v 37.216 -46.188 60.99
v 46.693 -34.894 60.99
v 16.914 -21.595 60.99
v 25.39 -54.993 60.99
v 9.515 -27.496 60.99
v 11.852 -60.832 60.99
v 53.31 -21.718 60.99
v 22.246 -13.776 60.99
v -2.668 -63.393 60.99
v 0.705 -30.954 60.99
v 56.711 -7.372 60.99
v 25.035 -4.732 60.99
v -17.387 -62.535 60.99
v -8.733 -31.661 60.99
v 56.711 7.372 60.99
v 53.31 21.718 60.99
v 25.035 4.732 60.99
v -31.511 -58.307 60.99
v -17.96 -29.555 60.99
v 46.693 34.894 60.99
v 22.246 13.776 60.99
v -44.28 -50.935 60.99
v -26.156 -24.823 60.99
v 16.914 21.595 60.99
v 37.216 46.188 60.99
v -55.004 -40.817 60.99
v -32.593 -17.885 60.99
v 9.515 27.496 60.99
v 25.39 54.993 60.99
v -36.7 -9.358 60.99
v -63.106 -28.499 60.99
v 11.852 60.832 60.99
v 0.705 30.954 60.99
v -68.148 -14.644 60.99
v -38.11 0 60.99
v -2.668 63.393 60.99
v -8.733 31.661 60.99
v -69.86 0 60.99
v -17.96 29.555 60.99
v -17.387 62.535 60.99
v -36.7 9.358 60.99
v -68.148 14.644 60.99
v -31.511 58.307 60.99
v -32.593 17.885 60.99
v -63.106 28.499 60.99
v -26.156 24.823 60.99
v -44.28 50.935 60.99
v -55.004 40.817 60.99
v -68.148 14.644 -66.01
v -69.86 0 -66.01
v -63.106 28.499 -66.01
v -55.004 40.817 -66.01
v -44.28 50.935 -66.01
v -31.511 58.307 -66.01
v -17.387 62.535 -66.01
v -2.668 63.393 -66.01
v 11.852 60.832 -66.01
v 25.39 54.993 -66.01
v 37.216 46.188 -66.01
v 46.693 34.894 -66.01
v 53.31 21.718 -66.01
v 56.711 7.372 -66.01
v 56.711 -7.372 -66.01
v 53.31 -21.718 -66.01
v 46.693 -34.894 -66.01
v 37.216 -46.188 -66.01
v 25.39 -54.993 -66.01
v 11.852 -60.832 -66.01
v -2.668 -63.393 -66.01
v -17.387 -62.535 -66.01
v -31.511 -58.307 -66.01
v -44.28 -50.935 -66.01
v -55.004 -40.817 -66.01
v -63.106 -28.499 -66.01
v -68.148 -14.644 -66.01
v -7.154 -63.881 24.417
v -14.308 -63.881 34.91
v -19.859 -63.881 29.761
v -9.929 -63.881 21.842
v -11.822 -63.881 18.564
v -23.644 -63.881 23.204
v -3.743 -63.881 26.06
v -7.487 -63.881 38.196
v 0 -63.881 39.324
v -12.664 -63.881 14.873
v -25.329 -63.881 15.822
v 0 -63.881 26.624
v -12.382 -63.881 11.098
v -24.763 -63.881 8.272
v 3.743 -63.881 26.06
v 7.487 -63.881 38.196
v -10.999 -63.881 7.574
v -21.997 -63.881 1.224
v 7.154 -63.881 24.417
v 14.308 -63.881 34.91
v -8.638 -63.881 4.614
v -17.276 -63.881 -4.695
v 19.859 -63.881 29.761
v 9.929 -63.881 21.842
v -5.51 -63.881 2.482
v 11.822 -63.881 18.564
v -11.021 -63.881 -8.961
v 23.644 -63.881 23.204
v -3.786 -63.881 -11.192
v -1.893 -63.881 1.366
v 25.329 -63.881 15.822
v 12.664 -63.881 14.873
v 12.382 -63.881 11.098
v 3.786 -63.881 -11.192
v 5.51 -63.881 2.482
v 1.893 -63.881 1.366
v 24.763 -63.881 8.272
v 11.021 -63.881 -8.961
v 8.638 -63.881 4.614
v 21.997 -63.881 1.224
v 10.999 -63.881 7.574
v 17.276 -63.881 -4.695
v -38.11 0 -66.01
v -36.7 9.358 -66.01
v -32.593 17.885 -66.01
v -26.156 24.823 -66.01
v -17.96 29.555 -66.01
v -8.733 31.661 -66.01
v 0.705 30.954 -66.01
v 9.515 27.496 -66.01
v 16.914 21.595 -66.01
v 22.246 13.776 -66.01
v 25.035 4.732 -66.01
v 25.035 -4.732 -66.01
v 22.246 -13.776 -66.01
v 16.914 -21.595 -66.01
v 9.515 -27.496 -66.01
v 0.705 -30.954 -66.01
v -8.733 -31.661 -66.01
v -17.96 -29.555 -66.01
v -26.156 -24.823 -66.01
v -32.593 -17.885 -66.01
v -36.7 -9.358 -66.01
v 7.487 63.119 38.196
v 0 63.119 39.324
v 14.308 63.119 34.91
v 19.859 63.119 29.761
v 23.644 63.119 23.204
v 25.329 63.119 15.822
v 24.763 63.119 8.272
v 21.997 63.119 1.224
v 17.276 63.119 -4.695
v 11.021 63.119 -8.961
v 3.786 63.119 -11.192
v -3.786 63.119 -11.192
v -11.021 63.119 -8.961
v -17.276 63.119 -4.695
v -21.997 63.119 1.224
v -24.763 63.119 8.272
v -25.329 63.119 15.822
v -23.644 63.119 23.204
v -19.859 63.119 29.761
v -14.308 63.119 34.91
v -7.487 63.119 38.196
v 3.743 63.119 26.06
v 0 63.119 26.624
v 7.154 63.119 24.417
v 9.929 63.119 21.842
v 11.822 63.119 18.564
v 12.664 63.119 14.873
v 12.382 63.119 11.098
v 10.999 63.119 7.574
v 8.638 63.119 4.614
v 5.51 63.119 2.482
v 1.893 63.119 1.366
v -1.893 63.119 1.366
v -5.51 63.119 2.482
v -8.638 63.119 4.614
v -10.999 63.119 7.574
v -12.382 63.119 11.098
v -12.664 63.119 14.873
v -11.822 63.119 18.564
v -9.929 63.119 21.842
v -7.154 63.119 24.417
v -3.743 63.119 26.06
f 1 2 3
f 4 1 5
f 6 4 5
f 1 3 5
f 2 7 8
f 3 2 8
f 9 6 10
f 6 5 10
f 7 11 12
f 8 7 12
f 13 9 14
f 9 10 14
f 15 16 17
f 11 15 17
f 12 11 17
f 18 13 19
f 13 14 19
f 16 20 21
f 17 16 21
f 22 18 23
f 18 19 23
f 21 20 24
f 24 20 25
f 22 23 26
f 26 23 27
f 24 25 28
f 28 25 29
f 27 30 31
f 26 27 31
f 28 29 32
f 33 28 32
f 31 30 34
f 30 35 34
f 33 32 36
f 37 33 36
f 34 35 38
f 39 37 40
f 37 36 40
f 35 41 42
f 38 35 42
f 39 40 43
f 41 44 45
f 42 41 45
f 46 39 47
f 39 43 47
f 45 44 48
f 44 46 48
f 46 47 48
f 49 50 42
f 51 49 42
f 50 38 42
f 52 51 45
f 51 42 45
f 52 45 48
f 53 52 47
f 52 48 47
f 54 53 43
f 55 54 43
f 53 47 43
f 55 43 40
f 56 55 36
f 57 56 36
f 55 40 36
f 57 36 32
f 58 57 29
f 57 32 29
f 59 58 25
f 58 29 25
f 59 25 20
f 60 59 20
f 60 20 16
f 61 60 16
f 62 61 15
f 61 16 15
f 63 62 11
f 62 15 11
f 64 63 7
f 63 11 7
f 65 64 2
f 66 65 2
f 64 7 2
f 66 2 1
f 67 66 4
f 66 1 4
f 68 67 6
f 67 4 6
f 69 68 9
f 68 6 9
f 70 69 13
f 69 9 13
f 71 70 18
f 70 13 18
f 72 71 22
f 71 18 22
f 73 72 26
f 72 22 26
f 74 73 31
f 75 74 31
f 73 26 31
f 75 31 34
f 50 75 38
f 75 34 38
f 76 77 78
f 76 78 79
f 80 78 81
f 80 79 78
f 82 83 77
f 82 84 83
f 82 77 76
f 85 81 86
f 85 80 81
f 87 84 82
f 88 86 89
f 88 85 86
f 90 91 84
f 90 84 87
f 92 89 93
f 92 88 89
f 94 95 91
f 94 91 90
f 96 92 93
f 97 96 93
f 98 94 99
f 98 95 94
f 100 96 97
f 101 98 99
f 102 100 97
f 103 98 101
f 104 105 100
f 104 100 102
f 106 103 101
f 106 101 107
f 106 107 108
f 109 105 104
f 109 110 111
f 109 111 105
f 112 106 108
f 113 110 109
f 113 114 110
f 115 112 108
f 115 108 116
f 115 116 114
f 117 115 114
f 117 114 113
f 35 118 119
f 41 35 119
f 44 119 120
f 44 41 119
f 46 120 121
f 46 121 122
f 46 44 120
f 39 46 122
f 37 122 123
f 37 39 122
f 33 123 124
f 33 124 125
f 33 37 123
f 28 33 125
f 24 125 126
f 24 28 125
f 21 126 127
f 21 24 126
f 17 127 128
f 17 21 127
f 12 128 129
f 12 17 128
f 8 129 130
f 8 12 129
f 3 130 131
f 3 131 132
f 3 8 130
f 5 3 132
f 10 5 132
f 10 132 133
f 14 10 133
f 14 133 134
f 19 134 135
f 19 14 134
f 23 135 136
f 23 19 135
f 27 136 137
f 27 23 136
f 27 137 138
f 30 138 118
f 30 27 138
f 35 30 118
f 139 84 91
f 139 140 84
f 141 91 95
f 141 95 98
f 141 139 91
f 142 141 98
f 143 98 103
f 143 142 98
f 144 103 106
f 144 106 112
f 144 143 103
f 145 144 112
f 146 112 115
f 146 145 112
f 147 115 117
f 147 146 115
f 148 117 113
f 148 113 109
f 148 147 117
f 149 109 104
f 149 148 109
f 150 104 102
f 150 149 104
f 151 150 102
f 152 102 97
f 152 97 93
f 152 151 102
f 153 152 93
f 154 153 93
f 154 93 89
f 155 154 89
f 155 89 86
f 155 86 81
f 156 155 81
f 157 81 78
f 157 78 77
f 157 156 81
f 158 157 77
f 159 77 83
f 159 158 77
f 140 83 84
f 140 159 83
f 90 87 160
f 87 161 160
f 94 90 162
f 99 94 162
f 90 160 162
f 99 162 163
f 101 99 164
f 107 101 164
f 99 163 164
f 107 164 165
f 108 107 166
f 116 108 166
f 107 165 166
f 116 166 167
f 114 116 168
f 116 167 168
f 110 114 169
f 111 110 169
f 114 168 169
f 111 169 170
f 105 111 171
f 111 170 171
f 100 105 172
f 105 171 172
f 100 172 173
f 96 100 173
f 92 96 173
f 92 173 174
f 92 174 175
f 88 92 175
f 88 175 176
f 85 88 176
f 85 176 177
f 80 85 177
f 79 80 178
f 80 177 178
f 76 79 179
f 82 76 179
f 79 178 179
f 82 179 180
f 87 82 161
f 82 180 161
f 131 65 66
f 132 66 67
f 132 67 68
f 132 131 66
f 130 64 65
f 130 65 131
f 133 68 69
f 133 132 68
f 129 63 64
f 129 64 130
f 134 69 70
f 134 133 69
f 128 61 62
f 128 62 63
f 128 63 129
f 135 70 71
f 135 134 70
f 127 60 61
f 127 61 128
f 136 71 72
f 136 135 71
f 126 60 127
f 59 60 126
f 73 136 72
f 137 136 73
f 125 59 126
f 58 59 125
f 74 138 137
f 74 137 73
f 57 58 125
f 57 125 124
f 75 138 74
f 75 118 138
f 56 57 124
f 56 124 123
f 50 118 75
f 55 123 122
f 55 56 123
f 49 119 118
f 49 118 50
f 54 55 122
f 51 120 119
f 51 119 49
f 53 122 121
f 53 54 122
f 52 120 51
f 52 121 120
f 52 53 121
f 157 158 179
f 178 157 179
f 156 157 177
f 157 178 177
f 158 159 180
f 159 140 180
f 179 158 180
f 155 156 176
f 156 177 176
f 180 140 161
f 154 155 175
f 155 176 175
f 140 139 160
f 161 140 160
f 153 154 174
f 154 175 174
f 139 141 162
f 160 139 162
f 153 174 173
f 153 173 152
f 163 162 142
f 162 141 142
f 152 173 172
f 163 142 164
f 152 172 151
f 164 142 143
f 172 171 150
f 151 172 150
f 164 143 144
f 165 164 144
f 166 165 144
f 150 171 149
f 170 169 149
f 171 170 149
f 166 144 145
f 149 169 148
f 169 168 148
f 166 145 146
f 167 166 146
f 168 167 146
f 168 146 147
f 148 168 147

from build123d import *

# Parameters (mm, degrees)
F0_W = 31.75
F0_H = 127
F2_W = 127
F2_H = 12.7


with BuildPart() as f1:
    # F0 (on Front) → F1 (revolve)
    with BuildSketch(Plane.XZ):
        with Locations((-53.985089, -2.509642)):
            Rectangle(F0_W, F0_H)
    revolve(axis=Axis((-6.360089, 0, -2.509642), (0, 0, -1)))


with BuildPart() as f3:
    # F2 (on Right) → F3 (revolve)
    with BuildSketch(Plane.YZ):
        with Locations((-0.381, 32.974018)):
            Rectangle(F2_W, F2_H)
    revolve(axis=Axis((0, -0.381, 13.924018), (0, 1, 0)))


solid = Compound([f1.part, f3.part])
